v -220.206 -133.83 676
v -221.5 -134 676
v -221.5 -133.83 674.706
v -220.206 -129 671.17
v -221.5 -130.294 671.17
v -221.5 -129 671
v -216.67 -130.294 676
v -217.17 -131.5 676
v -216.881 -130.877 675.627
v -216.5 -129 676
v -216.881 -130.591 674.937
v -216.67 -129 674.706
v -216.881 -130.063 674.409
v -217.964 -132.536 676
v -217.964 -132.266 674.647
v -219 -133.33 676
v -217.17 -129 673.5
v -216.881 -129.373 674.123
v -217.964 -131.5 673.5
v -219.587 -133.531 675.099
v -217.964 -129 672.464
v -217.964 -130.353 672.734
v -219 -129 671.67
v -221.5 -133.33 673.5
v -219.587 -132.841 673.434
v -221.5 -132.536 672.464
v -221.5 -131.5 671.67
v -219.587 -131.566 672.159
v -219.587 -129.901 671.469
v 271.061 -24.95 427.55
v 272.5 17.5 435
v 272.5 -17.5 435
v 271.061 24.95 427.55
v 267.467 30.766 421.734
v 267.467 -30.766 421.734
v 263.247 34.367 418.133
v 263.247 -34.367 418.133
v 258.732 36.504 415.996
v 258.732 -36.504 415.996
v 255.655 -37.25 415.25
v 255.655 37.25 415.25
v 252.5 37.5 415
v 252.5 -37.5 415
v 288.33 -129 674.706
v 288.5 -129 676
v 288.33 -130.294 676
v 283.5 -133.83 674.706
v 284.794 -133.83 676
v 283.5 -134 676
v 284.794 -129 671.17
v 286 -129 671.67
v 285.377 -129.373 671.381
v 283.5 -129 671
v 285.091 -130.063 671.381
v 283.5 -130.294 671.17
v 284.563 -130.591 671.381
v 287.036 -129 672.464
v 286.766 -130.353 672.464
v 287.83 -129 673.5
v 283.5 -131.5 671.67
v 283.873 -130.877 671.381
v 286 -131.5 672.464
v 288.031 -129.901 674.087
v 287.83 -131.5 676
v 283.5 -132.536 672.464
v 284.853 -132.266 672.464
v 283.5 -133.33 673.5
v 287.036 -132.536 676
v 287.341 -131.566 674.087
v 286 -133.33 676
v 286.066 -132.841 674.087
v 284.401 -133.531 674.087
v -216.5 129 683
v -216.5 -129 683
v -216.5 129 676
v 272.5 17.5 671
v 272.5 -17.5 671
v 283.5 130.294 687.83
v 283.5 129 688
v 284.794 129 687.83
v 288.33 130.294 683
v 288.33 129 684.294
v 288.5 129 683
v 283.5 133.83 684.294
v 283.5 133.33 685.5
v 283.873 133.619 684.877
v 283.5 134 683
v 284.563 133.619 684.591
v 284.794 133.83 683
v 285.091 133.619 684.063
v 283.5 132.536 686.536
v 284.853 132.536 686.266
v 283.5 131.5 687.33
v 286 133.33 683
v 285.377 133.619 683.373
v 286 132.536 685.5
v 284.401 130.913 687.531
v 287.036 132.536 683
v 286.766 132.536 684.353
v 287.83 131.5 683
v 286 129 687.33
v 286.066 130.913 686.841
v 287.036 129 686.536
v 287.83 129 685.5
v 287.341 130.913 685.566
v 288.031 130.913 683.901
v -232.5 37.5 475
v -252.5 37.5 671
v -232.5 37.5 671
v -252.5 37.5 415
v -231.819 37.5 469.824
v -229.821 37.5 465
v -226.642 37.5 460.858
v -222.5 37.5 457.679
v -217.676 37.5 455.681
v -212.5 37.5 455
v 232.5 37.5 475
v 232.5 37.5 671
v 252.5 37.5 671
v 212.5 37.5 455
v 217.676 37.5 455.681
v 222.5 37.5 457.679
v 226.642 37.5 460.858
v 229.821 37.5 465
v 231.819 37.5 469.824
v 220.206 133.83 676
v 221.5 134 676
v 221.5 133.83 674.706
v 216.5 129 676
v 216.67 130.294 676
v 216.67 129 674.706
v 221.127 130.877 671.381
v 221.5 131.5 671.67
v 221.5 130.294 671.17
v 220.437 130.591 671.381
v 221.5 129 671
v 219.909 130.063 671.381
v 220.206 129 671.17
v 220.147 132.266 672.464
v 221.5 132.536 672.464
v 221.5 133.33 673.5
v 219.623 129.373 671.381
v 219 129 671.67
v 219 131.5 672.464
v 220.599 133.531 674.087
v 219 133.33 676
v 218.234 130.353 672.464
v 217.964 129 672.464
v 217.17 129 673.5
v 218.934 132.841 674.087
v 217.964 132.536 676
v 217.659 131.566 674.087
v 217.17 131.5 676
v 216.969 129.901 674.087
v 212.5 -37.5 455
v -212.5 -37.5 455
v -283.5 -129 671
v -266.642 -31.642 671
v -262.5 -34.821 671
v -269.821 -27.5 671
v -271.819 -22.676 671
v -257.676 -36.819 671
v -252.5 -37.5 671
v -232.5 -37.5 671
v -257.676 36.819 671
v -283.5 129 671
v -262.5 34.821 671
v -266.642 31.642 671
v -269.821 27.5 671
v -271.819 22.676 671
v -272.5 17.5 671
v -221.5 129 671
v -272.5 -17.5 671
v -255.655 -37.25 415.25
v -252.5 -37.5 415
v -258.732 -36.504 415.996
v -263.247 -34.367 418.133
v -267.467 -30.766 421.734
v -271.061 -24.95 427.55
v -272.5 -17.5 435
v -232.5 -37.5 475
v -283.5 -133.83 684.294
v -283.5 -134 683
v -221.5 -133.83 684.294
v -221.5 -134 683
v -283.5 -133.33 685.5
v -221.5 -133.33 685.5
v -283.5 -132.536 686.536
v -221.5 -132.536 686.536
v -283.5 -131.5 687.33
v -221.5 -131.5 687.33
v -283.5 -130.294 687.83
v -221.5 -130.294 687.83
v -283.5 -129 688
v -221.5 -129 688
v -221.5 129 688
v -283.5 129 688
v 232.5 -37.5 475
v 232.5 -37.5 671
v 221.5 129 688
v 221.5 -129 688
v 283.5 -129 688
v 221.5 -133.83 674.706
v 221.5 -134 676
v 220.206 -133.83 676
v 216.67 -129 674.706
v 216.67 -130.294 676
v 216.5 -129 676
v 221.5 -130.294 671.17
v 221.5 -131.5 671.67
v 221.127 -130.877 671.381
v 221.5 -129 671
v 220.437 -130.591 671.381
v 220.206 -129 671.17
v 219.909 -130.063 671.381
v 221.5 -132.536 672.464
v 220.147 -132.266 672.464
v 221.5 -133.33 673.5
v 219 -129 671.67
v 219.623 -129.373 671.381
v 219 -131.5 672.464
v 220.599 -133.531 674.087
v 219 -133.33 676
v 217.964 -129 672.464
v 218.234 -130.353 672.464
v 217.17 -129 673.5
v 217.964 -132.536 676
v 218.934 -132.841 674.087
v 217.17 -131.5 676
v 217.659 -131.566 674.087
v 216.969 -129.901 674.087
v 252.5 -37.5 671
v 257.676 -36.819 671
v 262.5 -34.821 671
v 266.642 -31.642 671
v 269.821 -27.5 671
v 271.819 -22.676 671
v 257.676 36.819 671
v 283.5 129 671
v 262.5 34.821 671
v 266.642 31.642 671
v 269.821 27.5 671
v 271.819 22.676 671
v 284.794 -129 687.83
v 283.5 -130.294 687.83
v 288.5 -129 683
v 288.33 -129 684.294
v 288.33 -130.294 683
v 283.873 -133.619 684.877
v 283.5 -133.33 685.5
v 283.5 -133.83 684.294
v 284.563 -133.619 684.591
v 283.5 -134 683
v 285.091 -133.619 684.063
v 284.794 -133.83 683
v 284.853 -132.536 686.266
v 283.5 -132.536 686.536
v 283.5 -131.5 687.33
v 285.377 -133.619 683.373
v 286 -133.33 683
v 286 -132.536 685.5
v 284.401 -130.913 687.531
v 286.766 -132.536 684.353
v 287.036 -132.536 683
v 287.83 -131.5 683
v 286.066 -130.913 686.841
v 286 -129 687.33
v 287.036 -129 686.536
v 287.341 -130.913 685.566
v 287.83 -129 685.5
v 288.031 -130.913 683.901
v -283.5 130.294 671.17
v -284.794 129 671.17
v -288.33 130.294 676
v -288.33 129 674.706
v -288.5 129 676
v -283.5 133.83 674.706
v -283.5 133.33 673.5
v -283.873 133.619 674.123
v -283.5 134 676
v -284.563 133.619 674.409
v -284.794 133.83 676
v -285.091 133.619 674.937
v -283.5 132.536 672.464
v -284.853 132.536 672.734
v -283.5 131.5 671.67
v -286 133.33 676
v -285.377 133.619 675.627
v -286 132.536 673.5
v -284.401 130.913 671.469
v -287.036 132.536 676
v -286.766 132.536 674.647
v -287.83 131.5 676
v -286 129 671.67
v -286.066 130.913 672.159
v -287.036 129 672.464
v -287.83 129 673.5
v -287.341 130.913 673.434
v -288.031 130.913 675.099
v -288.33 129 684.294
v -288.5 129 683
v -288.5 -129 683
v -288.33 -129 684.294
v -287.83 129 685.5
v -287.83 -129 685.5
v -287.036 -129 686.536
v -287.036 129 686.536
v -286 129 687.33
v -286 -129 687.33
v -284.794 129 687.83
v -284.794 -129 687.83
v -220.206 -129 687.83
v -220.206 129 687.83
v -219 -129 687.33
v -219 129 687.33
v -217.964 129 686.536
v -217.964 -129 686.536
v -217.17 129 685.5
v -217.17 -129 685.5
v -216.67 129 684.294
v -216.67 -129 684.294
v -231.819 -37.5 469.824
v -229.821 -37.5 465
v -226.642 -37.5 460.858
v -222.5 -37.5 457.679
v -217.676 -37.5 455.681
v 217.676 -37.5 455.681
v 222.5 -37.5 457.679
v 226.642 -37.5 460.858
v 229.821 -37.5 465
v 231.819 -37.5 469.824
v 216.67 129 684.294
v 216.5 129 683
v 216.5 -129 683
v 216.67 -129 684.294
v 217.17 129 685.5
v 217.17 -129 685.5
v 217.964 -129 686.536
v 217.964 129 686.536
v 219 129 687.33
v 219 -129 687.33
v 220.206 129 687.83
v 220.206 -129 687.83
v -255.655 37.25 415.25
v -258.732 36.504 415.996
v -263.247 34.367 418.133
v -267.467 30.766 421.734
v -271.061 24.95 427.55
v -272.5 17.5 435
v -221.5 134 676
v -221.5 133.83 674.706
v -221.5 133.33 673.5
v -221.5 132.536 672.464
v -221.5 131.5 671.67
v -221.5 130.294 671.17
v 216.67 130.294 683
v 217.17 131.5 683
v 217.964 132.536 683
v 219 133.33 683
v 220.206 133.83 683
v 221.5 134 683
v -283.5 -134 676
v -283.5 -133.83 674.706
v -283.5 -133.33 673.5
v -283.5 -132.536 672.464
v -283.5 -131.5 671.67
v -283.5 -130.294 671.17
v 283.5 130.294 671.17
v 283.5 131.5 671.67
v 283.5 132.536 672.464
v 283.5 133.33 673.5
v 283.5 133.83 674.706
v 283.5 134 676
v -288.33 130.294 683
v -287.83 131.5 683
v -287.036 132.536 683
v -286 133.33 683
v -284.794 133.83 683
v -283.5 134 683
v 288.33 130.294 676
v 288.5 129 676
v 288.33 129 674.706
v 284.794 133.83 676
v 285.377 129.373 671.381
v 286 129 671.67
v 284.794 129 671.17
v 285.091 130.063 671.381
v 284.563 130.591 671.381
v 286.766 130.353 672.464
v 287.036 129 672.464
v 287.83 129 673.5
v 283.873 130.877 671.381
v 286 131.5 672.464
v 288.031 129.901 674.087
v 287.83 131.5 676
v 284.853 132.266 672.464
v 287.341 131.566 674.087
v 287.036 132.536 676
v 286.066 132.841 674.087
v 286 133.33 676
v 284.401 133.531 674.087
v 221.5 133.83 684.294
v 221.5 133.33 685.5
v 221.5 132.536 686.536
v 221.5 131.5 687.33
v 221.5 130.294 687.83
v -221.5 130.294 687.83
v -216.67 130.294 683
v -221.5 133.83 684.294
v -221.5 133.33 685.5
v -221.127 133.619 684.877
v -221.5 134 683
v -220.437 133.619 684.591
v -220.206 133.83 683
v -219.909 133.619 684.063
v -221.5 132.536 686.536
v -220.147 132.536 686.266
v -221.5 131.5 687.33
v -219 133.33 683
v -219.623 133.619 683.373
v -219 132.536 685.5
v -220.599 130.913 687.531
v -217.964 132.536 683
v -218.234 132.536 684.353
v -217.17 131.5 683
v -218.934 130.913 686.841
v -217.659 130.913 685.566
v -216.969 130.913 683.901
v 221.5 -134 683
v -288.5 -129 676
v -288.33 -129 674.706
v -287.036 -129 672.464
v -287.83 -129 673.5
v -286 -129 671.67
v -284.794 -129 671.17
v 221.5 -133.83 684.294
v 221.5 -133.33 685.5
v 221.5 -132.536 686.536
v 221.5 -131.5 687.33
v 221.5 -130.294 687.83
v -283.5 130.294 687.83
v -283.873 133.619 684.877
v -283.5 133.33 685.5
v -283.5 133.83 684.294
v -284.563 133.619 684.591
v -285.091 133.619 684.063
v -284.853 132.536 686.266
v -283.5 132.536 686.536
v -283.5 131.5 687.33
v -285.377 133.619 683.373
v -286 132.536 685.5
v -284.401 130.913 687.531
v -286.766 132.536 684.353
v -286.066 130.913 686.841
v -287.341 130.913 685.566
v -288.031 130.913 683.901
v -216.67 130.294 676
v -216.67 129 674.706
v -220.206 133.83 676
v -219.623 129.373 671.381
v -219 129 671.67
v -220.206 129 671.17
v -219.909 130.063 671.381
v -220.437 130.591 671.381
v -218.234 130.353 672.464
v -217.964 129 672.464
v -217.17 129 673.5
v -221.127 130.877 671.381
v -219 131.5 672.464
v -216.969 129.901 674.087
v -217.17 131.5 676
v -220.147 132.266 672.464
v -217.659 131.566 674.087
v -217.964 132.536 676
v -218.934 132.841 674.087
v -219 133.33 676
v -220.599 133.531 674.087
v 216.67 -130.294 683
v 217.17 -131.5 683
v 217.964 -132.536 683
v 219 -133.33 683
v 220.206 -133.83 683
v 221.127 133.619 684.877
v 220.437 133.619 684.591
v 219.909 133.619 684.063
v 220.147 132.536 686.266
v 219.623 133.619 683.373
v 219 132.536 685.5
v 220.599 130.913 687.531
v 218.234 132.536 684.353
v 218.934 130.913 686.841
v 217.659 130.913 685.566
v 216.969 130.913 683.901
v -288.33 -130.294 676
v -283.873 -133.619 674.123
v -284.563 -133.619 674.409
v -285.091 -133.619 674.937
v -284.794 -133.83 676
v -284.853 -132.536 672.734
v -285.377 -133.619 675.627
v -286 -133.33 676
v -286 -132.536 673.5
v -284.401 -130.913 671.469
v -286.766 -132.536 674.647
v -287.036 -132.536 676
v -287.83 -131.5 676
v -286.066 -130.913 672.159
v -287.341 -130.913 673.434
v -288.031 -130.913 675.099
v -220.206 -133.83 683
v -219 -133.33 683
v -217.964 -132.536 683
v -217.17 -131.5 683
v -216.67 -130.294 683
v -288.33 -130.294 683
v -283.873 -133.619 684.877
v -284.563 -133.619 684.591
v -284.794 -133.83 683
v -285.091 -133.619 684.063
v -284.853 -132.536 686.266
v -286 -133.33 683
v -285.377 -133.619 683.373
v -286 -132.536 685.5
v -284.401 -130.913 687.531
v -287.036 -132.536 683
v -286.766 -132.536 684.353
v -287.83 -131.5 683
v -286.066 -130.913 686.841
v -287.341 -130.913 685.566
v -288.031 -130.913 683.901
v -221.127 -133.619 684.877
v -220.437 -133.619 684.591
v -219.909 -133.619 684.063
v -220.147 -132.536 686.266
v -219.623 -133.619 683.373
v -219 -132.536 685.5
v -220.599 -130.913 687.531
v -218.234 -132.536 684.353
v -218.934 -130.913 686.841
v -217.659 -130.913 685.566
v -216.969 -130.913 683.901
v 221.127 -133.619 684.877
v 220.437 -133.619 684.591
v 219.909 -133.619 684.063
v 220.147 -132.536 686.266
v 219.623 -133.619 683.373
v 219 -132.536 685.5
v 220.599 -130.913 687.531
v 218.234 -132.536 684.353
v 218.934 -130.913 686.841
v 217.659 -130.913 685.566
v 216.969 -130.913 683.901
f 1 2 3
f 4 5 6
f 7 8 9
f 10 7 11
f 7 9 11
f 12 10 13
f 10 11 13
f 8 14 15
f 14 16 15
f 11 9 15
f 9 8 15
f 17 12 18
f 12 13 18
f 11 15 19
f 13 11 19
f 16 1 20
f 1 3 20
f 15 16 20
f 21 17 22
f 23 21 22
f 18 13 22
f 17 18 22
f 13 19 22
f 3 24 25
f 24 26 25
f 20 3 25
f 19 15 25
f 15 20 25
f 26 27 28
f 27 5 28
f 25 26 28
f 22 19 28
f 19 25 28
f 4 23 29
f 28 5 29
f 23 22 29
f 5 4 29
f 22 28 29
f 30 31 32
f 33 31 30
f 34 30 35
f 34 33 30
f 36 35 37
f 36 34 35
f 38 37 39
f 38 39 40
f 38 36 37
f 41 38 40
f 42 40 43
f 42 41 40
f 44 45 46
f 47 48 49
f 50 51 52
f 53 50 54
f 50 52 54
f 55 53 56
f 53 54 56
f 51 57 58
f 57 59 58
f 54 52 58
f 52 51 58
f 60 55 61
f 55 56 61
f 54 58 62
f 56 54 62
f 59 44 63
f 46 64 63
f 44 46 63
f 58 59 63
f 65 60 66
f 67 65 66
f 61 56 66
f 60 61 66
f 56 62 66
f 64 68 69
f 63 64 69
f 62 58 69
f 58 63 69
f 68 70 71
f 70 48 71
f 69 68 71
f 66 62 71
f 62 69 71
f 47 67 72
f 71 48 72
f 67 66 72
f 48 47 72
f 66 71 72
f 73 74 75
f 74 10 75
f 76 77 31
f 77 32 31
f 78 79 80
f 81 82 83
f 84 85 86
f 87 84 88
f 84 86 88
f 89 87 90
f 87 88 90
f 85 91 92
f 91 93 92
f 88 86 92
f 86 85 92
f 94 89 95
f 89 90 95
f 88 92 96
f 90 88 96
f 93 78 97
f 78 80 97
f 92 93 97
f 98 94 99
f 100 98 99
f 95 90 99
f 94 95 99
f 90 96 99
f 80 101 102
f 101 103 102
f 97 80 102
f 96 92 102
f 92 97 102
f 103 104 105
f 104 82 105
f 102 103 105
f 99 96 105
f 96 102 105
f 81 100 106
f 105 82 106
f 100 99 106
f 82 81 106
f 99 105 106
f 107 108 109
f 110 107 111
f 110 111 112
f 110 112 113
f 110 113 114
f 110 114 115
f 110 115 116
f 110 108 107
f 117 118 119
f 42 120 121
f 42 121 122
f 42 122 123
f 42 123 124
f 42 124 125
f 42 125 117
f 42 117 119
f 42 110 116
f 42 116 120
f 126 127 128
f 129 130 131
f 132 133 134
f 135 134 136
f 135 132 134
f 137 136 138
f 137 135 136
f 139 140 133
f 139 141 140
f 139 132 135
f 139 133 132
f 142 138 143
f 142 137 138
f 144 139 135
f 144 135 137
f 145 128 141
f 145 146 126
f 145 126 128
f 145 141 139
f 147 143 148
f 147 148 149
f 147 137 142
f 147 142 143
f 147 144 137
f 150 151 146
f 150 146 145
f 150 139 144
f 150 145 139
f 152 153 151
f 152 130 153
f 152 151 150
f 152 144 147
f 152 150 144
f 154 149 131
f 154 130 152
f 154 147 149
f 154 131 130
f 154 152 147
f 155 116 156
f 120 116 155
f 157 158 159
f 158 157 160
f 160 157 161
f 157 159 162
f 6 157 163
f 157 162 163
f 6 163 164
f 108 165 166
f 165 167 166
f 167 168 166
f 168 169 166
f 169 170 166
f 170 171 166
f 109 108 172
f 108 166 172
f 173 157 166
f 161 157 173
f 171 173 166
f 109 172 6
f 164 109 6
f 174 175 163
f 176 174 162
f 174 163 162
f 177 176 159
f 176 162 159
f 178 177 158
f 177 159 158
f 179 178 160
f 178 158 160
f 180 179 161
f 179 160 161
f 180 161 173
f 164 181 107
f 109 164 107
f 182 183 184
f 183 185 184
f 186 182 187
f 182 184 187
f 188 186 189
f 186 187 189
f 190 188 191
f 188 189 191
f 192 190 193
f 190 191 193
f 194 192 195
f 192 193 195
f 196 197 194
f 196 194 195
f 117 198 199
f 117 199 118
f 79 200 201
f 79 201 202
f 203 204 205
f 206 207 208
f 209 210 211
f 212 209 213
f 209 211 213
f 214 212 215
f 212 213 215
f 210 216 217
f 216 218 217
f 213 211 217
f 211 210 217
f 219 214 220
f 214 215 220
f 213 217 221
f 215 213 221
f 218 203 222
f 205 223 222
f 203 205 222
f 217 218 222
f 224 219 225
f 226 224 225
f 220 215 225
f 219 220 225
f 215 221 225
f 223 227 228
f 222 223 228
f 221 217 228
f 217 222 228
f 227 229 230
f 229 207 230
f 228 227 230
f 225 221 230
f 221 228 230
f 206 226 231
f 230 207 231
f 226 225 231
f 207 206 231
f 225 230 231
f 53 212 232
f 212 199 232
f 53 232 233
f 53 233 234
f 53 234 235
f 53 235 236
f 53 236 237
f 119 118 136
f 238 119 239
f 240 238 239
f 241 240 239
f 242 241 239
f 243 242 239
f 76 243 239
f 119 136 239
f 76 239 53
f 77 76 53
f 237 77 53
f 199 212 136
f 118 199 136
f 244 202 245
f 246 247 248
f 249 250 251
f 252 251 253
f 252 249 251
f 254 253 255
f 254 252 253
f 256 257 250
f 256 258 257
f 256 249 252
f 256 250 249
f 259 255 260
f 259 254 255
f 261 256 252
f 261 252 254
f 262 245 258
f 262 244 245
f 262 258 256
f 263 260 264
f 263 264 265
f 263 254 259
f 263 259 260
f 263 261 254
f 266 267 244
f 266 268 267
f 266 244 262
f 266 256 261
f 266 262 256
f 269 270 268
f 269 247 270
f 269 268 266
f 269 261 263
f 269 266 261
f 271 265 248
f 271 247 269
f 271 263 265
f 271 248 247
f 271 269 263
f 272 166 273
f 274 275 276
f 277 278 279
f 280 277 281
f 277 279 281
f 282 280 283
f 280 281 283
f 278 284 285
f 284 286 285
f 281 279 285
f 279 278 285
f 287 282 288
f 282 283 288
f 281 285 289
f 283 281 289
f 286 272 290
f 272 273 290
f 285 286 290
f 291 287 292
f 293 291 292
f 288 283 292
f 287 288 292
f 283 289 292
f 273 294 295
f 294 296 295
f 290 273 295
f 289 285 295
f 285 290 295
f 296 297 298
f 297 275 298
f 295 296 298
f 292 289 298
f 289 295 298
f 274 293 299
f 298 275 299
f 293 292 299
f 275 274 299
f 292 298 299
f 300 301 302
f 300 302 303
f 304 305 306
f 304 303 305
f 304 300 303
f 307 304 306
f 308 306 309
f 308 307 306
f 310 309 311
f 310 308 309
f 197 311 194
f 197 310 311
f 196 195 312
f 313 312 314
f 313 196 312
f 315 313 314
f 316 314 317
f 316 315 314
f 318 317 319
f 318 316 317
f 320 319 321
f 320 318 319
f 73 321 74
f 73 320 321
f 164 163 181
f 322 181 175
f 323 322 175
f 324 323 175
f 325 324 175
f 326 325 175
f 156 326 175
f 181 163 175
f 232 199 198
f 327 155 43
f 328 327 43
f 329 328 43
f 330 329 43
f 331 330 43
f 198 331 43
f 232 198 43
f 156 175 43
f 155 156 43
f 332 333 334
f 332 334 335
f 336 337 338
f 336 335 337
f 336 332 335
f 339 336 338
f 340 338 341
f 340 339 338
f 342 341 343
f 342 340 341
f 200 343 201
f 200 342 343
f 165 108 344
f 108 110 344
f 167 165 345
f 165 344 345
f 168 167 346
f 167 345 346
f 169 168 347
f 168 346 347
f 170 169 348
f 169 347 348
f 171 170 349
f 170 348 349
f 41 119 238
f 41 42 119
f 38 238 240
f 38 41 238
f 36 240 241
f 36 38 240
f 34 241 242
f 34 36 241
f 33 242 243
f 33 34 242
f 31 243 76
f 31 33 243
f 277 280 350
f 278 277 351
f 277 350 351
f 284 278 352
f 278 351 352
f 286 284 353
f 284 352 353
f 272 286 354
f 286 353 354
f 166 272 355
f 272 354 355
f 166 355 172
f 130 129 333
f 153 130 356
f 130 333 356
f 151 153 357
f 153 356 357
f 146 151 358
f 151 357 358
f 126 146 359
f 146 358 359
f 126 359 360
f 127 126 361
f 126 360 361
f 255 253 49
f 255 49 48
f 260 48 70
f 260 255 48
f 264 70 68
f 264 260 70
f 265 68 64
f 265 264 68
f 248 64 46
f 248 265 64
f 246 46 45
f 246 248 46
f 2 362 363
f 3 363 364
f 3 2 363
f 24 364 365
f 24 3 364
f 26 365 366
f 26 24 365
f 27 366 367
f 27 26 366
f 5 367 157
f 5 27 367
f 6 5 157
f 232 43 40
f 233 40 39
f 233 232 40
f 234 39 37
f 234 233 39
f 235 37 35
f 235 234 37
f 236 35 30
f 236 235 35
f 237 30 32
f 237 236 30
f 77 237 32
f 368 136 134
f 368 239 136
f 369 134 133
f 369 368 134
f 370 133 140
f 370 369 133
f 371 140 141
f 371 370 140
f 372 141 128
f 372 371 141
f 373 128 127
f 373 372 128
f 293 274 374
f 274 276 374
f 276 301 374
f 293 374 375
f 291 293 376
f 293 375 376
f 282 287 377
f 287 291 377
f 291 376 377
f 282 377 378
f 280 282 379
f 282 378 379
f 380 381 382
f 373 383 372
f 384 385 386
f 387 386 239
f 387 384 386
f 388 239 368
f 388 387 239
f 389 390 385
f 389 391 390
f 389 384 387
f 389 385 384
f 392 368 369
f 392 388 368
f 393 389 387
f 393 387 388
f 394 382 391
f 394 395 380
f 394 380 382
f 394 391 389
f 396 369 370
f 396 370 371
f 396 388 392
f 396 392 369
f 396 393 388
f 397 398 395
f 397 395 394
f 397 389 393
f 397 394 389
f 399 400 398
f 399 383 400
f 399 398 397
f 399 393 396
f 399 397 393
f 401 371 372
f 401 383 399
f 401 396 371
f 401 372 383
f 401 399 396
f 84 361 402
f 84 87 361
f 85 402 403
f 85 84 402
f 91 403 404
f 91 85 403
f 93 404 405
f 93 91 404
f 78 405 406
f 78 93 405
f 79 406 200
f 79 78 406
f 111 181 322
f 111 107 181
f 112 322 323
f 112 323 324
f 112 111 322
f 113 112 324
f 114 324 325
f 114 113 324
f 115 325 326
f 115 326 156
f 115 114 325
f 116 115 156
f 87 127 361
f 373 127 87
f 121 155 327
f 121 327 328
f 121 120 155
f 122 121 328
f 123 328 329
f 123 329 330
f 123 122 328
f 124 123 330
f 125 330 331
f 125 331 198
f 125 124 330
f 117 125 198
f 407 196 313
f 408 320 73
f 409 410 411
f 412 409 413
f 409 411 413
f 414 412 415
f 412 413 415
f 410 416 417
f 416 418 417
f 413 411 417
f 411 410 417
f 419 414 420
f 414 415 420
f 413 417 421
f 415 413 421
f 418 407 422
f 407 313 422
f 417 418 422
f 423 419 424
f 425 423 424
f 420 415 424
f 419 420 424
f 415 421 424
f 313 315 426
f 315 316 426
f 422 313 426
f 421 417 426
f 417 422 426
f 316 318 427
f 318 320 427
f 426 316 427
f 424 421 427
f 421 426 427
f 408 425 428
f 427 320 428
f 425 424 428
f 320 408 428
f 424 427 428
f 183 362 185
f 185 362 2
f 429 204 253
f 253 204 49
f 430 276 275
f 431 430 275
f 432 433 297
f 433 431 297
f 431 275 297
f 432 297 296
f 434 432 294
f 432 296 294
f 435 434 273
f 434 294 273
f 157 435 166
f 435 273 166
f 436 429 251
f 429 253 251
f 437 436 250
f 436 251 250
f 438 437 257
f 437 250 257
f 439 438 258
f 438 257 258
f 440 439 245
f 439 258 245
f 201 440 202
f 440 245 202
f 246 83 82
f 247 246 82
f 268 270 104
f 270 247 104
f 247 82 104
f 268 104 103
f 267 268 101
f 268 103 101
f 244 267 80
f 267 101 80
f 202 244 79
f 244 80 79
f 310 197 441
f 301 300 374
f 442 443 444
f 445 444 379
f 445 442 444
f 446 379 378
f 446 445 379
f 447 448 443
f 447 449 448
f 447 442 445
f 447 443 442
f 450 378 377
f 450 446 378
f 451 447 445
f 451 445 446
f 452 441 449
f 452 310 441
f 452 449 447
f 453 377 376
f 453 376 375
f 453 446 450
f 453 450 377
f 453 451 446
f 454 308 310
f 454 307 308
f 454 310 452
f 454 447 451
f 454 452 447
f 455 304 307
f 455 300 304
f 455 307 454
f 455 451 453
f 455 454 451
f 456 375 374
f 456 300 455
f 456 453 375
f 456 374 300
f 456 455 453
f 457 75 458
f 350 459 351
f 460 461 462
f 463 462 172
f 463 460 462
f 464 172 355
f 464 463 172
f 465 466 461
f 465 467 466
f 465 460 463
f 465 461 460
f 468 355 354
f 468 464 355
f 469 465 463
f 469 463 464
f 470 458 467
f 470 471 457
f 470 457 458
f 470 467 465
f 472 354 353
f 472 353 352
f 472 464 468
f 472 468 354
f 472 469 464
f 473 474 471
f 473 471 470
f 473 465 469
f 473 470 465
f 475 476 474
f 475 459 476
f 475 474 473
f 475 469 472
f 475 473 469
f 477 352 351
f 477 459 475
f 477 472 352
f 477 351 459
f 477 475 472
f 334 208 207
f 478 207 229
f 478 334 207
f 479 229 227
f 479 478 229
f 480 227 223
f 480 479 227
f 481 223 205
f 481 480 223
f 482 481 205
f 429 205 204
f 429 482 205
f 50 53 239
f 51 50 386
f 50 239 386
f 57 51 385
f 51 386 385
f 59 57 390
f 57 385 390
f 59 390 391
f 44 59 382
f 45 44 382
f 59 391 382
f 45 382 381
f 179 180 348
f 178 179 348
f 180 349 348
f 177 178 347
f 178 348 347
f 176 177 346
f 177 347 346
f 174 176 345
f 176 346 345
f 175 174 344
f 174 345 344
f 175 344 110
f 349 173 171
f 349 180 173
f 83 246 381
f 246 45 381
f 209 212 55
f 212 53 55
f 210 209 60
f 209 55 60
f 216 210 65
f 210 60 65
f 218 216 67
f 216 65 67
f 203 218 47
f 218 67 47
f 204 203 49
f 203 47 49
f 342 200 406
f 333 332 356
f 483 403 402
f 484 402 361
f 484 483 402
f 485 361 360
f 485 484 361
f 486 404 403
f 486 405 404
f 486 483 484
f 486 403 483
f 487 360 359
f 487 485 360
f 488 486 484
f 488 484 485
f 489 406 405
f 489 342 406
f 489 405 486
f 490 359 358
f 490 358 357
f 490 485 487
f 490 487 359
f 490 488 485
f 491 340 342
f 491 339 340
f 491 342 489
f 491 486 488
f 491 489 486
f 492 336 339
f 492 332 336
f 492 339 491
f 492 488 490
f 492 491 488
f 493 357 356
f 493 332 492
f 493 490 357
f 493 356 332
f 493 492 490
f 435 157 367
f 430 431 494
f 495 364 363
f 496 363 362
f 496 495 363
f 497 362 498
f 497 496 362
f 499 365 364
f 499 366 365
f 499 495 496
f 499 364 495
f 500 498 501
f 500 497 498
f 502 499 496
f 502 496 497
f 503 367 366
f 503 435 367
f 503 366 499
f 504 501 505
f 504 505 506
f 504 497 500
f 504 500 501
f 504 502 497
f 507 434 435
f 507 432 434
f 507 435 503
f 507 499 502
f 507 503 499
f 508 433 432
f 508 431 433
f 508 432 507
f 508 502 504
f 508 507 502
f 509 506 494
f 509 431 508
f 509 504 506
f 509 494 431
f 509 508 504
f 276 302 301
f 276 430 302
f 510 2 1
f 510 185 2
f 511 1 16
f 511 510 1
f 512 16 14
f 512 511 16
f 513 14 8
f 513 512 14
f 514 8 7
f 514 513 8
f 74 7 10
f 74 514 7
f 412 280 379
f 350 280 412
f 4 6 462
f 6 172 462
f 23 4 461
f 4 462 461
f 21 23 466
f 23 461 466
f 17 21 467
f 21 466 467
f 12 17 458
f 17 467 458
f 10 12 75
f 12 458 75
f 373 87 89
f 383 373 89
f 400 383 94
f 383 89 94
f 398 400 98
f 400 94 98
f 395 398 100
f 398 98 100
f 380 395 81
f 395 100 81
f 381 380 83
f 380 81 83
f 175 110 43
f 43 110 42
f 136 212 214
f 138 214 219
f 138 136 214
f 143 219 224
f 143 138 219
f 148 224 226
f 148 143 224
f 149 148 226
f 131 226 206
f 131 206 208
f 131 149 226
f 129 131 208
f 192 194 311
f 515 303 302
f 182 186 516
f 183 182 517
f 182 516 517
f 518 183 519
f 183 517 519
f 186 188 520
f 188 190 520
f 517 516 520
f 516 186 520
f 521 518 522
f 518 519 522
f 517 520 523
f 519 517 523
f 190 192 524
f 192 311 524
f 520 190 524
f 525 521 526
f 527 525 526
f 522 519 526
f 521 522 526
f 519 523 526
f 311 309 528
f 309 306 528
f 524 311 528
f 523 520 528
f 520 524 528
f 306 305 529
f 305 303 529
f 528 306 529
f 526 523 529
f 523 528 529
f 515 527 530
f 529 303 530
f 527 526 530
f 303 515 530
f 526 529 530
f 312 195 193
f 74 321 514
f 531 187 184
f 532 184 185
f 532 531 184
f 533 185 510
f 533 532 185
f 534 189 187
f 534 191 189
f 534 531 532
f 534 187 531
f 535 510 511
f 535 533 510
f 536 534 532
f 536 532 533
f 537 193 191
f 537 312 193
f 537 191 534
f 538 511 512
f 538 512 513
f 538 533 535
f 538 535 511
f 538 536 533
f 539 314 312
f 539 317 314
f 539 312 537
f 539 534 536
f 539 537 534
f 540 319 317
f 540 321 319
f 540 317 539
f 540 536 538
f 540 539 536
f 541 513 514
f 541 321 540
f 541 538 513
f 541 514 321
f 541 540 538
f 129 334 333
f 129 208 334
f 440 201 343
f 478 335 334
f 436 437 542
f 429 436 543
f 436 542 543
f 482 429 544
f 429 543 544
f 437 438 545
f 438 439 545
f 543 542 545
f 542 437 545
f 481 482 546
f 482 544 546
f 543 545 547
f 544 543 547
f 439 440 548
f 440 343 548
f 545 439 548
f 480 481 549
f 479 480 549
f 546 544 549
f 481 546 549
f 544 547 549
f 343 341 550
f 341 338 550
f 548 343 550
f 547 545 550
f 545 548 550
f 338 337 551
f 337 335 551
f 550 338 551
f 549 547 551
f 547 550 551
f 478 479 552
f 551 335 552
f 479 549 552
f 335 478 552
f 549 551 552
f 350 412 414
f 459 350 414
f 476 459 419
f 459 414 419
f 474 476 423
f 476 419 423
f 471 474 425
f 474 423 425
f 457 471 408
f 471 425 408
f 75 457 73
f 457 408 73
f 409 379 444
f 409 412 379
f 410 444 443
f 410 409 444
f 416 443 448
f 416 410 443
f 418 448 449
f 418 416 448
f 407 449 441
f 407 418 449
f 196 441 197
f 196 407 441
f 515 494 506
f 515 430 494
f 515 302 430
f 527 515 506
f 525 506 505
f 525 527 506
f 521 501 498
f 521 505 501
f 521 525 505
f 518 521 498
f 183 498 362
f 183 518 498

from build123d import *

# Parameters (mm, degrees)
SKETCH004_W  = 545
SKETCH004_H  = 75
PAD004_DEPTH = 40
SKETCH005_W  = 40
SKETCH005_H  = 75
PAD005_DEPTH = 216
SKETCH006_W  = 72
SKETCH006_H  = 268
PAD006_DEPTH = 17
FILLET003_R  = 5
FILLET004_R  = 20


with BuildPart() as part:
    # Sketch004 (on Face1 of CopyPad003) → Pad004 (new body)
    with BuildSketch(Plane.XY.offset(415)):
        Rectangle(SKETCH004_W, SKETCH004_H)
    extrude(amount=PAD004_DEPTH)

    # Sketch005 (on Face6 of Pad004) → Pad005 (join)
    with BuildSketch(Plane.XY.offset(455)):
        with Locations((-252.5, 0)):
            Rectangle(SKETCH005_W, SKETCH005_H)
        with Locations((252.5, 0)):
            Rectangle(SKETCH005_W, SKETCH005_H)
    extrude(amount=PAD005_DEPTH)

    # Sketch006 (on Face5 of Pad005) → Pad006 (join)
    with BuildSketch(Plane.XY.offset(671)):
        with Locations((-252.5, 0)):
            Rectangle(SKETCH006_W, SKETCH006_H)
        with Locations((252.5, 0)):
            Rectangle(SKETCH006_W, SKETCH006_H)
    extrude(amount=PAD006_DEPTH)

    # Fillet003
    fillet003_edges = [part.edges().sort_by_distance(p)[0] for p in [
        (-288.5, 0, 688),
        (-216.5, 0, 688),
        (216.5, 0, 688),
        (288.5, 0, 688),
        (252.5, -134, 688),
        (252.5, 134, 688),
        (-252.5, 134, 688),
        (-252.5, -134, 688),
        (216.5, -134, 679.5),
        (288.5, -134, 679.5),
        (288.5, 134, 679.5),
        (216.5, 134, 679.5),
        (288.5, 0, 671),
        (252.5, 134, 671),
        (252.5, -134, 671),
        (216.5, 0, 671),
        (-288.5, 0, 671),
        (-252.5, -134, 671),
        (-288.5, -134, 679.5),
        (-216.5, -134, 679.5),
        (-216.5, 134, 679.5),
        (-216.5, 0, 671),
        (-252.5, 134, 671),
        (-288.5, 134, 679.5),
    ]]
    fillet(fillet003_edges, radius=FILLET003_R)

    # Fillet004
    fillet004_edges = [part.edges().sort_by_distance(p)[0] for p in [
        (-272.5, 0, 415),
        (-232.5, 0, 455),
        (232.5, 0, 455),
        (272.5, 0, 415),
        (272.5, -37.5, 543),
        (272.5, 37.5, 543),
        (-272.5, -37.5, 543),
        (-272.5, 37.5, 543),
    ]]
    fillet(fillet004_edges, radius=FILLET004_R)


solid = part.part
